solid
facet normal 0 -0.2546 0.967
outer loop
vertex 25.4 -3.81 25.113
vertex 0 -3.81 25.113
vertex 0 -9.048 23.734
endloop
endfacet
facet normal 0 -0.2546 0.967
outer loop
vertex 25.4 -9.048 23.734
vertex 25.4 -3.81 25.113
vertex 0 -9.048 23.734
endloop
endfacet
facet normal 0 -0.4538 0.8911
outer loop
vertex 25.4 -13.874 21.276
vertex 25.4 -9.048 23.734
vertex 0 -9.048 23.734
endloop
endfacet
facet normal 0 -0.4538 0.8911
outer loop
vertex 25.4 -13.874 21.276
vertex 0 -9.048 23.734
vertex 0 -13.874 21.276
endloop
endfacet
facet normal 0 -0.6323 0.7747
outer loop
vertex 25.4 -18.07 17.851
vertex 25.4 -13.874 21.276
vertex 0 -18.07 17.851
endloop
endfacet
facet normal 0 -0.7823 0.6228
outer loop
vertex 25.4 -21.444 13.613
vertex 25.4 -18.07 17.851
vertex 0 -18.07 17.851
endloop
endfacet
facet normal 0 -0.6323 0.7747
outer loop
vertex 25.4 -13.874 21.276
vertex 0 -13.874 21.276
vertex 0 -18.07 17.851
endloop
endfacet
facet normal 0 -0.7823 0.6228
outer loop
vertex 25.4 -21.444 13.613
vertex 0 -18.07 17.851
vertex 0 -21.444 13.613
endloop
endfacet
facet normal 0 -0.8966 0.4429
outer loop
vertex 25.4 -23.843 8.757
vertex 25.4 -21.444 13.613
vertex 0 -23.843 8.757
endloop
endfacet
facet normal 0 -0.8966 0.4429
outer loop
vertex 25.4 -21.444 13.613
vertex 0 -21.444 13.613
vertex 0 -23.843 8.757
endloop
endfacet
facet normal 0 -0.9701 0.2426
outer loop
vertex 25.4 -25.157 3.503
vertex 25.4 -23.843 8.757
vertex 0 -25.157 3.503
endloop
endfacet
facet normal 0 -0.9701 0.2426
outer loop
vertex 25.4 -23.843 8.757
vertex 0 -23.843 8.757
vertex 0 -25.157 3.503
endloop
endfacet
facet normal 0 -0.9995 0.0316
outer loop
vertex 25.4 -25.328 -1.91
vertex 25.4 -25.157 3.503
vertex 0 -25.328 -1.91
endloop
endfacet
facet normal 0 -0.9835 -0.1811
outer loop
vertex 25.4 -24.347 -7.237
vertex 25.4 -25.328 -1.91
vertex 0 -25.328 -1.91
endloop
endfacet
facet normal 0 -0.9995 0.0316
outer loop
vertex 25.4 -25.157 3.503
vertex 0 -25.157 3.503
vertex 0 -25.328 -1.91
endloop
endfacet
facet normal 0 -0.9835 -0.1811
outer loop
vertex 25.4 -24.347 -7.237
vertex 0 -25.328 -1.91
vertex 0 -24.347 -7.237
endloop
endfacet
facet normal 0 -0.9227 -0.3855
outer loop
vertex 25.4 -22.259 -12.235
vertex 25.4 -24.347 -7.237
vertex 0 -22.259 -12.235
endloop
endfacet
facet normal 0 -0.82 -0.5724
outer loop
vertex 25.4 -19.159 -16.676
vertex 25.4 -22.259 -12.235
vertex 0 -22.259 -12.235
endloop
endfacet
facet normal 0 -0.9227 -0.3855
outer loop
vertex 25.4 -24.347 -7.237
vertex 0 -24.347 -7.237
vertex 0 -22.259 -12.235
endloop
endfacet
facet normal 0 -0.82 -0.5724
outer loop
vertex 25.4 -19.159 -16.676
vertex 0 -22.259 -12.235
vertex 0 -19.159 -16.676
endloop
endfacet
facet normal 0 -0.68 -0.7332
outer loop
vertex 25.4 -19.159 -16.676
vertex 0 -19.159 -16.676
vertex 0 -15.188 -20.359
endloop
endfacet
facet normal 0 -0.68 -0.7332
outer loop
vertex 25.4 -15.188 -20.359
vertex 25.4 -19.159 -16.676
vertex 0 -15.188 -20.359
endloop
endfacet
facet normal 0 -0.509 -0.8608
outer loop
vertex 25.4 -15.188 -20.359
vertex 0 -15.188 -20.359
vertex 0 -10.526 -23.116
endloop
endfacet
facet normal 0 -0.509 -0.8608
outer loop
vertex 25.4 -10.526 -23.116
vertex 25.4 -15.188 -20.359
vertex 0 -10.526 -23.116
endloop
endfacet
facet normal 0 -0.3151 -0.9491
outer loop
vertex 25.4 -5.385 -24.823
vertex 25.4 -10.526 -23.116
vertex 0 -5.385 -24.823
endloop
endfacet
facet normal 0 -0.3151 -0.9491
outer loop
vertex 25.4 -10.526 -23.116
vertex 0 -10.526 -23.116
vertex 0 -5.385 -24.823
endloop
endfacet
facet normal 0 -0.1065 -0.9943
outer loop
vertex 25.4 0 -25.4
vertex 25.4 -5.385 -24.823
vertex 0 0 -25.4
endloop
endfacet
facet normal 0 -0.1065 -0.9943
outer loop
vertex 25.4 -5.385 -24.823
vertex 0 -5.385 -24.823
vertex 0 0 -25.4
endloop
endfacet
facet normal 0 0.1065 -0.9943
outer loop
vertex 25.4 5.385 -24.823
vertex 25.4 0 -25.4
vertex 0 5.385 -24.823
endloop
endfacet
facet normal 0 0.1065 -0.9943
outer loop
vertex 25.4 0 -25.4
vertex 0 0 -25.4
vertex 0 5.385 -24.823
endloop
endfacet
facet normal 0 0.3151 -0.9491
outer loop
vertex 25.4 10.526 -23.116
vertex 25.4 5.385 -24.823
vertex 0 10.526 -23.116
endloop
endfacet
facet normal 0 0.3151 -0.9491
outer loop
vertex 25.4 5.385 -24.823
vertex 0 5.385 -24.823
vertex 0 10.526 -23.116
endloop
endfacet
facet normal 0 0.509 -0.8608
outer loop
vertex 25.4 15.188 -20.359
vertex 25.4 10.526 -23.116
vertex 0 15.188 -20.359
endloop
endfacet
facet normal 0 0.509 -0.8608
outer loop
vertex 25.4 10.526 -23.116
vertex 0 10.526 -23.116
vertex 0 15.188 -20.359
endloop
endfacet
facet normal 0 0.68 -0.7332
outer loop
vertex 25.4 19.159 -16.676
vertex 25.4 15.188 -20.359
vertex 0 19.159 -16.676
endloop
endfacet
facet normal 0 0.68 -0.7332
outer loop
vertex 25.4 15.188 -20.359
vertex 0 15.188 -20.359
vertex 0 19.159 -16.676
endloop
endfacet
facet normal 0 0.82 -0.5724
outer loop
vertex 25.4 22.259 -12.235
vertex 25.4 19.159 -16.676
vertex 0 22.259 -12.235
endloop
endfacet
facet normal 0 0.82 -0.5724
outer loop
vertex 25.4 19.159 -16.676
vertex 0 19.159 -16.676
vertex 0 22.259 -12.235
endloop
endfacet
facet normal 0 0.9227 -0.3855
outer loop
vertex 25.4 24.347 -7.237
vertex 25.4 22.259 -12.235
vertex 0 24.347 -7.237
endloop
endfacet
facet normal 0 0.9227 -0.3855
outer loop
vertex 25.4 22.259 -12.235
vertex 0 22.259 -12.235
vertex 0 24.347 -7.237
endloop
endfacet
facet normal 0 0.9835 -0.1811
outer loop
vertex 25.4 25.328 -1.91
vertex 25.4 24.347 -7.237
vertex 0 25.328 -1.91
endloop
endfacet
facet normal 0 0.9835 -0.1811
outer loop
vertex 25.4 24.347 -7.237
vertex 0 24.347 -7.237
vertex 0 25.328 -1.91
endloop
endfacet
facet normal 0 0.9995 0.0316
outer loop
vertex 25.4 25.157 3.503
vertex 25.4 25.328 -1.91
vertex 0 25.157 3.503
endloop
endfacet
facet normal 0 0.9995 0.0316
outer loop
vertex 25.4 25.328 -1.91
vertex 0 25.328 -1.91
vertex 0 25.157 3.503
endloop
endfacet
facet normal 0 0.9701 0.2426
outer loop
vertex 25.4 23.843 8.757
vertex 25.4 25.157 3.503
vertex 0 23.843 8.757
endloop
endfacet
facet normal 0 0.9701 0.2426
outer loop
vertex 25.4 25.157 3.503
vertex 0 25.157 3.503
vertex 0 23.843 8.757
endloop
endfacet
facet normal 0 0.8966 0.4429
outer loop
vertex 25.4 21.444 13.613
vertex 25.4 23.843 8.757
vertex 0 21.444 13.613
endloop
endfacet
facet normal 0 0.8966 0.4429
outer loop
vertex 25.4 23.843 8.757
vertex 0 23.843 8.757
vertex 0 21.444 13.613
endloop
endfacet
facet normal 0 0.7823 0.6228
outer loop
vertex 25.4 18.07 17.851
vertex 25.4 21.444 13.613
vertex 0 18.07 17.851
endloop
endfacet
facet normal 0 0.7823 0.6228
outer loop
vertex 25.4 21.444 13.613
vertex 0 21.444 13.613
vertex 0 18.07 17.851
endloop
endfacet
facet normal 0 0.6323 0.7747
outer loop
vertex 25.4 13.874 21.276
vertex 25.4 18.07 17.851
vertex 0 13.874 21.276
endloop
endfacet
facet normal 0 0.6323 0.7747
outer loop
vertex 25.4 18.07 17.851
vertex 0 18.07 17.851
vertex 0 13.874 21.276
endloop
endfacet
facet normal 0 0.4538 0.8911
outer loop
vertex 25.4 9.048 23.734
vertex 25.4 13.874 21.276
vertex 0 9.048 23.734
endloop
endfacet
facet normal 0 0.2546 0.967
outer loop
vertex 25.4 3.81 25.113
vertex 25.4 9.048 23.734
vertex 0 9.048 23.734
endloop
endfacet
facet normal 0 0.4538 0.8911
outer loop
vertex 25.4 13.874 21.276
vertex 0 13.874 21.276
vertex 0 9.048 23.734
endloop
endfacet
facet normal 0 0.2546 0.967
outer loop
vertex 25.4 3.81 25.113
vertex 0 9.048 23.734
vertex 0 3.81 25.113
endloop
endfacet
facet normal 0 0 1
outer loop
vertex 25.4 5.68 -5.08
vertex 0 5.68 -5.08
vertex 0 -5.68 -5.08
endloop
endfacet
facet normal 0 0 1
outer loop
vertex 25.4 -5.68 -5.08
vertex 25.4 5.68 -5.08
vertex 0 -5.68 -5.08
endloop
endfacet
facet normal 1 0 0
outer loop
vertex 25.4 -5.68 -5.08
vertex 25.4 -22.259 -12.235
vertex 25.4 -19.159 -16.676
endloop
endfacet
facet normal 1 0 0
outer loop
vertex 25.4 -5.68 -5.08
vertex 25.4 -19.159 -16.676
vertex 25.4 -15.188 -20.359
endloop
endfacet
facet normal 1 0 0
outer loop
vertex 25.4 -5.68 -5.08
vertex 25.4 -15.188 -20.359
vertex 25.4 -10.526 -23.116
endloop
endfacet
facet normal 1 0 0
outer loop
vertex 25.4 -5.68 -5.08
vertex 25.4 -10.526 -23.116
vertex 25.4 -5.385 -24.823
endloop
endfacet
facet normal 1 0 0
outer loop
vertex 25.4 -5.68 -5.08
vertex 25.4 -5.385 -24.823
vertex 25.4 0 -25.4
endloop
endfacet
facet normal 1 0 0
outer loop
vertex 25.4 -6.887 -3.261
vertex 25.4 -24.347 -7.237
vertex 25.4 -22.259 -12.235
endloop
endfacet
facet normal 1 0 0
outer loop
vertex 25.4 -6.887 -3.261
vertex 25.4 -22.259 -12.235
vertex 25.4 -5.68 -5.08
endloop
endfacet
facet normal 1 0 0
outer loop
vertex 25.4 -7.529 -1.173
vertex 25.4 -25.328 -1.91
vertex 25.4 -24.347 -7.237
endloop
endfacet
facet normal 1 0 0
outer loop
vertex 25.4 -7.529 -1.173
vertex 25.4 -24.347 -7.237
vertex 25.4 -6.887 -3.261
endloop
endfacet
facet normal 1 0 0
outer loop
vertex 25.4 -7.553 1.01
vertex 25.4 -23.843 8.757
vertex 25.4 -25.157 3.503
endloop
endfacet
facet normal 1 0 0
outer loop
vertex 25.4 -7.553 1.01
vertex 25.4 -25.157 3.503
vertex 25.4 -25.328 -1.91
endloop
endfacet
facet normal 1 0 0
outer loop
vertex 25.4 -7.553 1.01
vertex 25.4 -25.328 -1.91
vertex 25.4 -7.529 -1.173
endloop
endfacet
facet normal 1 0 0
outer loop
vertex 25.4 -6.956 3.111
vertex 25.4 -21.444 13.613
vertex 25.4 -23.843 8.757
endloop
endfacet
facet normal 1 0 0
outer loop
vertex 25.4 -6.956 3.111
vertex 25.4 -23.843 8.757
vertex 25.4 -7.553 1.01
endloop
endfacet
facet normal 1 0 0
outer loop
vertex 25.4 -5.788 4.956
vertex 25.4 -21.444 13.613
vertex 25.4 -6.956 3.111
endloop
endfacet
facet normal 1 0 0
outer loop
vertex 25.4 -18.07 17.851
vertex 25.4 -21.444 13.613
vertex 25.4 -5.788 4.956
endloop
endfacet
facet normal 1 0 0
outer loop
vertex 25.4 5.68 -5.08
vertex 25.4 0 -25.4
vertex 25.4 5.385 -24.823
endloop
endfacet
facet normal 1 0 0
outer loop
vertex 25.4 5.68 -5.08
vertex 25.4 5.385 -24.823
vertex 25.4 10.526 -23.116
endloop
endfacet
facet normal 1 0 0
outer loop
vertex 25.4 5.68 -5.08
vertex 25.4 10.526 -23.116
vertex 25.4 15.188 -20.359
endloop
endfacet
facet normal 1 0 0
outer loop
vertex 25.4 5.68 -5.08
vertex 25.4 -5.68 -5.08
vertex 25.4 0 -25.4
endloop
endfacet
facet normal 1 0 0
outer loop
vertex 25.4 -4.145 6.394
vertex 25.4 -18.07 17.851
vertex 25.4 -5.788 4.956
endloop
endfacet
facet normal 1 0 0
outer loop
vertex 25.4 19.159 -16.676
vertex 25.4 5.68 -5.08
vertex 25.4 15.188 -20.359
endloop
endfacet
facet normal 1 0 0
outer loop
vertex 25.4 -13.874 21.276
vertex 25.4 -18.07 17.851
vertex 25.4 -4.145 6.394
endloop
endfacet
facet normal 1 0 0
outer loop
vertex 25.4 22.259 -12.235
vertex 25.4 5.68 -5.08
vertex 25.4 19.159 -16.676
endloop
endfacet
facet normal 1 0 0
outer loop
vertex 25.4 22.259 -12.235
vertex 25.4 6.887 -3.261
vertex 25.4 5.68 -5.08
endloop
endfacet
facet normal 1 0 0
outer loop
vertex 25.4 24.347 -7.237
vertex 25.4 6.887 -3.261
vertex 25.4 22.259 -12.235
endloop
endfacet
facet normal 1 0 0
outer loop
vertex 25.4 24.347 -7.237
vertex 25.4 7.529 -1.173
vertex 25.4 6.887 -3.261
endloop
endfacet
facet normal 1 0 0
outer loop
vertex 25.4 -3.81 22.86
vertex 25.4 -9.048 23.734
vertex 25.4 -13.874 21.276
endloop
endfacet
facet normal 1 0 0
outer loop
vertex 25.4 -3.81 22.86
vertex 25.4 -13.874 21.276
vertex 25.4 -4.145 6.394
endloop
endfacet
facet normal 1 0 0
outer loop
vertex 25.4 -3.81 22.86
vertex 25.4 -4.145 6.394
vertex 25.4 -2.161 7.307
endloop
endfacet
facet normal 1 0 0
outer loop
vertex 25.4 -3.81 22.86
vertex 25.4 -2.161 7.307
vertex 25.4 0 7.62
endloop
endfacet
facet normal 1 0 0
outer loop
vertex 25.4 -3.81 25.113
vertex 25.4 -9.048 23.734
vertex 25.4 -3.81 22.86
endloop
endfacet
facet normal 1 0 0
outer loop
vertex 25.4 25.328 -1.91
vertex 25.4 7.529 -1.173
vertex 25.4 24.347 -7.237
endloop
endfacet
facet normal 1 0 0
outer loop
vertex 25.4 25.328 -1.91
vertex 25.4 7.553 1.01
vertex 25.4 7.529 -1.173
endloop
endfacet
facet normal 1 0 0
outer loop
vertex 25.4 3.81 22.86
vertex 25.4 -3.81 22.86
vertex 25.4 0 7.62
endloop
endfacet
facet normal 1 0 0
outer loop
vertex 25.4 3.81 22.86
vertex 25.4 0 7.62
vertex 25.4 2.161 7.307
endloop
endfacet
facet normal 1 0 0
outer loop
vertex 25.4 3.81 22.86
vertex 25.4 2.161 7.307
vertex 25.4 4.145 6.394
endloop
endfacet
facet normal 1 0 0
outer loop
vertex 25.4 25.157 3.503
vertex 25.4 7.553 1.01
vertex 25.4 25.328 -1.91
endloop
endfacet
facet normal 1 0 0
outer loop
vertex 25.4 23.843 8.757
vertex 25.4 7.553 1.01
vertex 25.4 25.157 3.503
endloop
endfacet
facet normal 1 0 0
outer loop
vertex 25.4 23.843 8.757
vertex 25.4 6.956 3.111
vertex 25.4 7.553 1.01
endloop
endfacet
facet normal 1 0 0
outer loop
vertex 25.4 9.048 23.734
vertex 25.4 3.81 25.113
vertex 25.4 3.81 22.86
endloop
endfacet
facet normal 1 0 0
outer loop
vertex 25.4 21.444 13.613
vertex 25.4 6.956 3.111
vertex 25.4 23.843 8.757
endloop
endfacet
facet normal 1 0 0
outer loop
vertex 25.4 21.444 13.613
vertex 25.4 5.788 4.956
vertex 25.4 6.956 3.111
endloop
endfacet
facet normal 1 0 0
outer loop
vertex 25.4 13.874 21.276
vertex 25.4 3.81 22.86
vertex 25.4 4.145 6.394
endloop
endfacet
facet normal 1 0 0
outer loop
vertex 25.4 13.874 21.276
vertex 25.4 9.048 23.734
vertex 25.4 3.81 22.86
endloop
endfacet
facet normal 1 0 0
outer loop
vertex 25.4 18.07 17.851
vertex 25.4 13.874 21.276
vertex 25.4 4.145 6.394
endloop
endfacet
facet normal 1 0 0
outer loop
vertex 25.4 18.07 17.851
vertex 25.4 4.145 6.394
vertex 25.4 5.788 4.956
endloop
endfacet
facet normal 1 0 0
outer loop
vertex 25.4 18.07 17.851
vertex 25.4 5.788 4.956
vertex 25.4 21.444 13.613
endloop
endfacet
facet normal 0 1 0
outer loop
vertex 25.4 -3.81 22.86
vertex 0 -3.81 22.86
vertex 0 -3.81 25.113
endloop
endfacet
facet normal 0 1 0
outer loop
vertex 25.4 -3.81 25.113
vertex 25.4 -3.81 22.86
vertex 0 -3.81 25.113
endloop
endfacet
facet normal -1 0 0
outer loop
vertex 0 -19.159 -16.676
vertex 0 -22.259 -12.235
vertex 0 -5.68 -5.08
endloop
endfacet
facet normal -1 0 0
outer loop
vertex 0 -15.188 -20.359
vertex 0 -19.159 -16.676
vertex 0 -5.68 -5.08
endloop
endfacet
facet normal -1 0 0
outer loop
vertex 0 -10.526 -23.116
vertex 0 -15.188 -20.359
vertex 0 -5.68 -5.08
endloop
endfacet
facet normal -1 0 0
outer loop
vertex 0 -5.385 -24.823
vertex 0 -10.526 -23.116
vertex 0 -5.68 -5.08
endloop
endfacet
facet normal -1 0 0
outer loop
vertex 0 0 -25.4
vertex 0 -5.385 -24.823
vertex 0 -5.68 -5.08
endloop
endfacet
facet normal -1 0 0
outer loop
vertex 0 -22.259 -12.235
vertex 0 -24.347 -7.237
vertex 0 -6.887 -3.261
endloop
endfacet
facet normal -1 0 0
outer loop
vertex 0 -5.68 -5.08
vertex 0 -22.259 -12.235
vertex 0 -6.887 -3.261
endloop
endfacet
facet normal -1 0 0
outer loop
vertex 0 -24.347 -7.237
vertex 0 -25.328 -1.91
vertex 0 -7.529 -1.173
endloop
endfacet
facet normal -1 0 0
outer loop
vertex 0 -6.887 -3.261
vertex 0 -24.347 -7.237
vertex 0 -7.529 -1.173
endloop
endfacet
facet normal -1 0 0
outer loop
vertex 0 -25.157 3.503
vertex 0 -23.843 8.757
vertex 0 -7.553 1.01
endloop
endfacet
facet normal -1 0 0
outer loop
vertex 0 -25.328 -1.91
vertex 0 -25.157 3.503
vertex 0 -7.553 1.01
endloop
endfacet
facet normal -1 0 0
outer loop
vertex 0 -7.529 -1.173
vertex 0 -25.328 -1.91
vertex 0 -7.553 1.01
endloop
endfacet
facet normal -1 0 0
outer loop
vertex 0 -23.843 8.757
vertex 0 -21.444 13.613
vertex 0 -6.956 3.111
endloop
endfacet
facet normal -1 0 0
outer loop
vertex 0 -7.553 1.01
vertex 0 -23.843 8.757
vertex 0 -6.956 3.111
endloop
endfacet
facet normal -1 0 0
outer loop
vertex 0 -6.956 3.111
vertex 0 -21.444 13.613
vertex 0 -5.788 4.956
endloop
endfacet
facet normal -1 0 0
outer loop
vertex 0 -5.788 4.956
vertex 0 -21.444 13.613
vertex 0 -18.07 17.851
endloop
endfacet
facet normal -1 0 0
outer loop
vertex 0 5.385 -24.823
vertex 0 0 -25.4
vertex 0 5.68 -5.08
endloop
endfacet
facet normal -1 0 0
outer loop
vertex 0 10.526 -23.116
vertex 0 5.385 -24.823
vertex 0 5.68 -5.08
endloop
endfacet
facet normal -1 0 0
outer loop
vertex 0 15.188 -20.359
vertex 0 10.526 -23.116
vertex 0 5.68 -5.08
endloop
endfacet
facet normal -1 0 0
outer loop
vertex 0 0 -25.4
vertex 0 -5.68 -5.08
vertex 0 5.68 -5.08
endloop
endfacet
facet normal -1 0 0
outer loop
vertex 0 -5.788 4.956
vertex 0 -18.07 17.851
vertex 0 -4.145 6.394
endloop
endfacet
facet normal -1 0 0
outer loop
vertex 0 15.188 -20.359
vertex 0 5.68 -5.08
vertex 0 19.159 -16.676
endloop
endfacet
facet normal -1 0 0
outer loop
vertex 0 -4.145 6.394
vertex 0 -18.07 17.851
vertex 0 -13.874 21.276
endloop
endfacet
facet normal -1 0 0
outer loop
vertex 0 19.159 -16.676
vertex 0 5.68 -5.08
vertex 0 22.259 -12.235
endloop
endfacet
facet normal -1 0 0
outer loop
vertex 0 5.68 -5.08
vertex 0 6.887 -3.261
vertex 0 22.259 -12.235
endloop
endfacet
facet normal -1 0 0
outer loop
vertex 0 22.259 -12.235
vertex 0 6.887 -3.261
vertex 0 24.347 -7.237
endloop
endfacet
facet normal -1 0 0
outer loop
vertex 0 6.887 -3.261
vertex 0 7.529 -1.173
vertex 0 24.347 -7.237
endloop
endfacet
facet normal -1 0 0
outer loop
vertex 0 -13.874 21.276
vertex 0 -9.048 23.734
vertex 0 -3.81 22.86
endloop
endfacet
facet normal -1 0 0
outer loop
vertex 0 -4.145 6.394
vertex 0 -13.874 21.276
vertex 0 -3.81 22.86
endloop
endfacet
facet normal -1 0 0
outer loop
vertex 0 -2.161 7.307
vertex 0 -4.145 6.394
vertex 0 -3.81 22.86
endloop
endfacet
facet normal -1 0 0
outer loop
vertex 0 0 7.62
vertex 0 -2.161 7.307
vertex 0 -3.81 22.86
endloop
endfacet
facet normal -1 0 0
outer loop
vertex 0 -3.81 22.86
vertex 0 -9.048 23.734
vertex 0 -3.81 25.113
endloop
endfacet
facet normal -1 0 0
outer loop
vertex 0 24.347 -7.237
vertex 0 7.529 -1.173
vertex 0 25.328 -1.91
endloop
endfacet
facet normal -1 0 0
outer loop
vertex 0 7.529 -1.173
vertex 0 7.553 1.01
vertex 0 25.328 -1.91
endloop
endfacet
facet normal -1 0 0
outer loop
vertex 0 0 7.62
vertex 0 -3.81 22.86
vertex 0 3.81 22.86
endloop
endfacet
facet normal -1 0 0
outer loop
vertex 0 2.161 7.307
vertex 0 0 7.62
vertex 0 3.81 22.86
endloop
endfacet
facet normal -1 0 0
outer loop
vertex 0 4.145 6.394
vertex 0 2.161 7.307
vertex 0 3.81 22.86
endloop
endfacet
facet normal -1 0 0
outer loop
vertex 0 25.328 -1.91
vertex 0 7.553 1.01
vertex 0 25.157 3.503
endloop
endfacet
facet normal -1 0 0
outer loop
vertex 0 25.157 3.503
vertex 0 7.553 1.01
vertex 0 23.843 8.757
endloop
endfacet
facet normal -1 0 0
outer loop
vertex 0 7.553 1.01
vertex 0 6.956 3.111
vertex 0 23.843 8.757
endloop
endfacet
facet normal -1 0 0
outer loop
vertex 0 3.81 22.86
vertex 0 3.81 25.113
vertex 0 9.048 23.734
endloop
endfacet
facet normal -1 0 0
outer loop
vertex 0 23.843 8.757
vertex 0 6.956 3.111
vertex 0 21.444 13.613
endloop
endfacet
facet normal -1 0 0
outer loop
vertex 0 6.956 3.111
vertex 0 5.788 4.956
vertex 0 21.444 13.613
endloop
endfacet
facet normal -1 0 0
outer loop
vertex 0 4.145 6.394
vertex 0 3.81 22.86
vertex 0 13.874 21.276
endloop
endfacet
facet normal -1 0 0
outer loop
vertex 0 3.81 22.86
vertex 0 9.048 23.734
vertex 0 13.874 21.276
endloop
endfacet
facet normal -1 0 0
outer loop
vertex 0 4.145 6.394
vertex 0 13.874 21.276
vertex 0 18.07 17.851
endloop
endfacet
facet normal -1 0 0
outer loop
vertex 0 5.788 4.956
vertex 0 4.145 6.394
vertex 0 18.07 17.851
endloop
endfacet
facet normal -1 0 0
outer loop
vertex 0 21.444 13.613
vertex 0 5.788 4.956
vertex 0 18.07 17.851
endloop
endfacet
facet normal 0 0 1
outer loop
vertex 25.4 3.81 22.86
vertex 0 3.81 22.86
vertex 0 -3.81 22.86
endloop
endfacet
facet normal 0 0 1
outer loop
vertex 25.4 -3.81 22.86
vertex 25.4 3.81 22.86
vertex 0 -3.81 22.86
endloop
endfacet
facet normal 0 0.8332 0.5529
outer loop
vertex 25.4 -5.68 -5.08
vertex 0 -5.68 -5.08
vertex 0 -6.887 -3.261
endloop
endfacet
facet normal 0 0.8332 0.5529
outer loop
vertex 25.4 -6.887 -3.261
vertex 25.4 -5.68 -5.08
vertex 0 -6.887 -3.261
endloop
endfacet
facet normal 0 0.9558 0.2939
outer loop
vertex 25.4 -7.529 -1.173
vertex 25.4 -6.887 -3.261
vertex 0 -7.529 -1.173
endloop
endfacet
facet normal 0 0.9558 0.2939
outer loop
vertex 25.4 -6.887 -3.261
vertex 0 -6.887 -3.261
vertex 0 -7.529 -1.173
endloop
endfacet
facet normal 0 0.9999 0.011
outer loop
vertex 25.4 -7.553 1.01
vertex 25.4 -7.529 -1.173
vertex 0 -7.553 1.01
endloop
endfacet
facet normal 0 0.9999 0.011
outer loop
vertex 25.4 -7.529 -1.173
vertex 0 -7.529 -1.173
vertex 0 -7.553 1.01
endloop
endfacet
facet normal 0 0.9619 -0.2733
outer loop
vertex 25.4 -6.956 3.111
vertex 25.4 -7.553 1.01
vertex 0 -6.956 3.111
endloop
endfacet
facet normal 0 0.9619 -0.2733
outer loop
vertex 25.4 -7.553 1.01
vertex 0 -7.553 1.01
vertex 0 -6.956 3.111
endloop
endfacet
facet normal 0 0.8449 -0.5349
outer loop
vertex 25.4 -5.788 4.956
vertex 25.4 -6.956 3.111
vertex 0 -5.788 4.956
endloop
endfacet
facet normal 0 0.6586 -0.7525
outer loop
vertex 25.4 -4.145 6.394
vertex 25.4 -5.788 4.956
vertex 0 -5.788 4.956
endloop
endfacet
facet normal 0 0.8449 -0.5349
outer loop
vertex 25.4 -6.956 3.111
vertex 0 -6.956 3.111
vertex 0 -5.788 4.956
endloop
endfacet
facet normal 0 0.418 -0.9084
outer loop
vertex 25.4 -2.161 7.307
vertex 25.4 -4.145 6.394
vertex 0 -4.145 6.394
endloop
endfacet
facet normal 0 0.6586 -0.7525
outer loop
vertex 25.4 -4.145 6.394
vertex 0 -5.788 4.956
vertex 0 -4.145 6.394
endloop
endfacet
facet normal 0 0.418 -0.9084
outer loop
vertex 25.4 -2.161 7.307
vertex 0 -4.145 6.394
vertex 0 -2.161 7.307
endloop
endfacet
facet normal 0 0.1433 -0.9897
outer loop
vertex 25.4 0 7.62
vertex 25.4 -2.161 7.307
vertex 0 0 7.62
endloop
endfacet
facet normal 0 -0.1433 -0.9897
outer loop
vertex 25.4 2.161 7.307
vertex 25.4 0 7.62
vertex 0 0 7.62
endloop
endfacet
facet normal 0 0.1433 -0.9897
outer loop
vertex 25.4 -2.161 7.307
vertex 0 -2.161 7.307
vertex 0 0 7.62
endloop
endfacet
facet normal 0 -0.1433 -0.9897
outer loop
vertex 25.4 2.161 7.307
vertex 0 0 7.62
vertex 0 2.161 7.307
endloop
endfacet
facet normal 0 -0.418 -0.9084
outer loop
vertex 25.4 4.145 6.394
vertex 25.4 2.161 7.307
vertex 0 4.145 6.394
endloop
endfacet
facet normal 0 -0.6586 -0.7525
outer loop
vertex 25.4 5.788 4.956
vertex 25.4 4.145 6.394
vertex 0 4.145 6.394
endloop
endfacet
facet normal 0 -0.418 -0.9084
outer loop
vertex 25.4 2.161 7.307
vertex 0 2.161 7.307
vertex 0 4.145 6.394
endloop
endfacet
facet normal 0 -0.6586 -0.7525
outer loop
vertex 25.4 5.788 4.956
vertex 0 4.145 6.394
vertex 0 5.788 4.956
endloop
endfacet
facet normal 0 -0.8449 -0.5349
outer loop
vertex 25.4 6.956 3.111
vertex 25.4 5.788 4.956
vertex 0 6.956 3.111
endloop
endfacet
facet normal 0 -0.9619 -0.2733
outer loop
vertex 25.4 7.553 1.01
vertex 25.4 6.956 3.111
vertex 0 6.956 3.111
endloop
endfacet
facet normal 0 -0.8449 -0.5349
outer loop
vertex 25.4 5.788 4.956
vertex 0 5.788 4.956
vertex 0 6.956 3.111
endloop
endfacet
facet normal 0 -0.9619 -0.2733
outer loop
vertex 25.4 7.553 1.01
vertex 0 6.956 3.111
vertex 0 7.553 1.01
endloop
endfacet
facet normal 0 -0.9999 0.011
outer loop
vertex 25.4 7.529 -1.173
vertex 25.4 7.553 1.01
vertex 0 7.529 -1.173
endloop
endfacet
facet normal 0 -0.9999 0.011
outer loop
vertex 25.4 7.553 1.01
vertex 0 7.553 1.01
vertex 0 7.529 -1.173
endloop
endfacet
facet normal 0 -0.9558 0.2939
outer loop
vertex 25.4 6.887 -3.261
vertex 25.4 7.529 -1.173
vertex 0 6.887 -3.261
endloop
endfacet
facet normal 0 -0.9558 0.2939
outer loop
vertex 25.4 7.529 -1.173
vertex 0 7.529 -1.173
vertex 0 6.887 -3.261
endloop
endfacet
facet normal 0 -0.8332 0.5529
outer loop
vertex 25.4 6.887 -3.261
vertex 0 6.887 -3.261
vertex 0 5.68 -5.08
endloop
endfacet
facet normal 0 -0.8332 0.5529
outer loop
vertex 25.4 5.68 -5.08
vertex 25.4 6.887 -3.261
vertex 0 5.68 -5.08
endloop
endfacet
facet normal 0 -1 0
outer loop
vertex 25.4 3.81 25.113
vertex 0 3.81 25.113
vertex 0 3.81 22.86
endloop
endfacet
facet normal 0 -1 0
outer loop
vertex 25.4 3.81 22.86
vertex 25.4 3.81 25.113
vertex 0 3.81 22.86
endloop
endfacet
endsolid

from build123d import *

# Parameters (mm, degrees)
F1_DEPTH = 25.4


with BuildPart() as f1:
    # F0 (on Right) → F1 (new body)
    with BuildSketch(Plane.YZ):
        with BuildLine():
            Line((-3.81, 22.86), (-3.81, 25.112624))
            ThreePointArc((-3.81, 25.112624), (0, -25.4), (3.81, 25.112624))
            Line((3.81, 25.112624), (3.81, 22.86))
            Line((3.81, 22.86), (-3.81, 22.86))
        make_face()
        with BuildLine():
            ThreePointArc((-5.679613, -5.08), (0, 7.62), (5.679613, -5.08))
            Line((5.679613, -5.08), (-5.679613, -5.08))
        make_face(mode=Mode.SUBTRACT)
    extrude(amount=F1_DEPTH)


solid = f1.part
